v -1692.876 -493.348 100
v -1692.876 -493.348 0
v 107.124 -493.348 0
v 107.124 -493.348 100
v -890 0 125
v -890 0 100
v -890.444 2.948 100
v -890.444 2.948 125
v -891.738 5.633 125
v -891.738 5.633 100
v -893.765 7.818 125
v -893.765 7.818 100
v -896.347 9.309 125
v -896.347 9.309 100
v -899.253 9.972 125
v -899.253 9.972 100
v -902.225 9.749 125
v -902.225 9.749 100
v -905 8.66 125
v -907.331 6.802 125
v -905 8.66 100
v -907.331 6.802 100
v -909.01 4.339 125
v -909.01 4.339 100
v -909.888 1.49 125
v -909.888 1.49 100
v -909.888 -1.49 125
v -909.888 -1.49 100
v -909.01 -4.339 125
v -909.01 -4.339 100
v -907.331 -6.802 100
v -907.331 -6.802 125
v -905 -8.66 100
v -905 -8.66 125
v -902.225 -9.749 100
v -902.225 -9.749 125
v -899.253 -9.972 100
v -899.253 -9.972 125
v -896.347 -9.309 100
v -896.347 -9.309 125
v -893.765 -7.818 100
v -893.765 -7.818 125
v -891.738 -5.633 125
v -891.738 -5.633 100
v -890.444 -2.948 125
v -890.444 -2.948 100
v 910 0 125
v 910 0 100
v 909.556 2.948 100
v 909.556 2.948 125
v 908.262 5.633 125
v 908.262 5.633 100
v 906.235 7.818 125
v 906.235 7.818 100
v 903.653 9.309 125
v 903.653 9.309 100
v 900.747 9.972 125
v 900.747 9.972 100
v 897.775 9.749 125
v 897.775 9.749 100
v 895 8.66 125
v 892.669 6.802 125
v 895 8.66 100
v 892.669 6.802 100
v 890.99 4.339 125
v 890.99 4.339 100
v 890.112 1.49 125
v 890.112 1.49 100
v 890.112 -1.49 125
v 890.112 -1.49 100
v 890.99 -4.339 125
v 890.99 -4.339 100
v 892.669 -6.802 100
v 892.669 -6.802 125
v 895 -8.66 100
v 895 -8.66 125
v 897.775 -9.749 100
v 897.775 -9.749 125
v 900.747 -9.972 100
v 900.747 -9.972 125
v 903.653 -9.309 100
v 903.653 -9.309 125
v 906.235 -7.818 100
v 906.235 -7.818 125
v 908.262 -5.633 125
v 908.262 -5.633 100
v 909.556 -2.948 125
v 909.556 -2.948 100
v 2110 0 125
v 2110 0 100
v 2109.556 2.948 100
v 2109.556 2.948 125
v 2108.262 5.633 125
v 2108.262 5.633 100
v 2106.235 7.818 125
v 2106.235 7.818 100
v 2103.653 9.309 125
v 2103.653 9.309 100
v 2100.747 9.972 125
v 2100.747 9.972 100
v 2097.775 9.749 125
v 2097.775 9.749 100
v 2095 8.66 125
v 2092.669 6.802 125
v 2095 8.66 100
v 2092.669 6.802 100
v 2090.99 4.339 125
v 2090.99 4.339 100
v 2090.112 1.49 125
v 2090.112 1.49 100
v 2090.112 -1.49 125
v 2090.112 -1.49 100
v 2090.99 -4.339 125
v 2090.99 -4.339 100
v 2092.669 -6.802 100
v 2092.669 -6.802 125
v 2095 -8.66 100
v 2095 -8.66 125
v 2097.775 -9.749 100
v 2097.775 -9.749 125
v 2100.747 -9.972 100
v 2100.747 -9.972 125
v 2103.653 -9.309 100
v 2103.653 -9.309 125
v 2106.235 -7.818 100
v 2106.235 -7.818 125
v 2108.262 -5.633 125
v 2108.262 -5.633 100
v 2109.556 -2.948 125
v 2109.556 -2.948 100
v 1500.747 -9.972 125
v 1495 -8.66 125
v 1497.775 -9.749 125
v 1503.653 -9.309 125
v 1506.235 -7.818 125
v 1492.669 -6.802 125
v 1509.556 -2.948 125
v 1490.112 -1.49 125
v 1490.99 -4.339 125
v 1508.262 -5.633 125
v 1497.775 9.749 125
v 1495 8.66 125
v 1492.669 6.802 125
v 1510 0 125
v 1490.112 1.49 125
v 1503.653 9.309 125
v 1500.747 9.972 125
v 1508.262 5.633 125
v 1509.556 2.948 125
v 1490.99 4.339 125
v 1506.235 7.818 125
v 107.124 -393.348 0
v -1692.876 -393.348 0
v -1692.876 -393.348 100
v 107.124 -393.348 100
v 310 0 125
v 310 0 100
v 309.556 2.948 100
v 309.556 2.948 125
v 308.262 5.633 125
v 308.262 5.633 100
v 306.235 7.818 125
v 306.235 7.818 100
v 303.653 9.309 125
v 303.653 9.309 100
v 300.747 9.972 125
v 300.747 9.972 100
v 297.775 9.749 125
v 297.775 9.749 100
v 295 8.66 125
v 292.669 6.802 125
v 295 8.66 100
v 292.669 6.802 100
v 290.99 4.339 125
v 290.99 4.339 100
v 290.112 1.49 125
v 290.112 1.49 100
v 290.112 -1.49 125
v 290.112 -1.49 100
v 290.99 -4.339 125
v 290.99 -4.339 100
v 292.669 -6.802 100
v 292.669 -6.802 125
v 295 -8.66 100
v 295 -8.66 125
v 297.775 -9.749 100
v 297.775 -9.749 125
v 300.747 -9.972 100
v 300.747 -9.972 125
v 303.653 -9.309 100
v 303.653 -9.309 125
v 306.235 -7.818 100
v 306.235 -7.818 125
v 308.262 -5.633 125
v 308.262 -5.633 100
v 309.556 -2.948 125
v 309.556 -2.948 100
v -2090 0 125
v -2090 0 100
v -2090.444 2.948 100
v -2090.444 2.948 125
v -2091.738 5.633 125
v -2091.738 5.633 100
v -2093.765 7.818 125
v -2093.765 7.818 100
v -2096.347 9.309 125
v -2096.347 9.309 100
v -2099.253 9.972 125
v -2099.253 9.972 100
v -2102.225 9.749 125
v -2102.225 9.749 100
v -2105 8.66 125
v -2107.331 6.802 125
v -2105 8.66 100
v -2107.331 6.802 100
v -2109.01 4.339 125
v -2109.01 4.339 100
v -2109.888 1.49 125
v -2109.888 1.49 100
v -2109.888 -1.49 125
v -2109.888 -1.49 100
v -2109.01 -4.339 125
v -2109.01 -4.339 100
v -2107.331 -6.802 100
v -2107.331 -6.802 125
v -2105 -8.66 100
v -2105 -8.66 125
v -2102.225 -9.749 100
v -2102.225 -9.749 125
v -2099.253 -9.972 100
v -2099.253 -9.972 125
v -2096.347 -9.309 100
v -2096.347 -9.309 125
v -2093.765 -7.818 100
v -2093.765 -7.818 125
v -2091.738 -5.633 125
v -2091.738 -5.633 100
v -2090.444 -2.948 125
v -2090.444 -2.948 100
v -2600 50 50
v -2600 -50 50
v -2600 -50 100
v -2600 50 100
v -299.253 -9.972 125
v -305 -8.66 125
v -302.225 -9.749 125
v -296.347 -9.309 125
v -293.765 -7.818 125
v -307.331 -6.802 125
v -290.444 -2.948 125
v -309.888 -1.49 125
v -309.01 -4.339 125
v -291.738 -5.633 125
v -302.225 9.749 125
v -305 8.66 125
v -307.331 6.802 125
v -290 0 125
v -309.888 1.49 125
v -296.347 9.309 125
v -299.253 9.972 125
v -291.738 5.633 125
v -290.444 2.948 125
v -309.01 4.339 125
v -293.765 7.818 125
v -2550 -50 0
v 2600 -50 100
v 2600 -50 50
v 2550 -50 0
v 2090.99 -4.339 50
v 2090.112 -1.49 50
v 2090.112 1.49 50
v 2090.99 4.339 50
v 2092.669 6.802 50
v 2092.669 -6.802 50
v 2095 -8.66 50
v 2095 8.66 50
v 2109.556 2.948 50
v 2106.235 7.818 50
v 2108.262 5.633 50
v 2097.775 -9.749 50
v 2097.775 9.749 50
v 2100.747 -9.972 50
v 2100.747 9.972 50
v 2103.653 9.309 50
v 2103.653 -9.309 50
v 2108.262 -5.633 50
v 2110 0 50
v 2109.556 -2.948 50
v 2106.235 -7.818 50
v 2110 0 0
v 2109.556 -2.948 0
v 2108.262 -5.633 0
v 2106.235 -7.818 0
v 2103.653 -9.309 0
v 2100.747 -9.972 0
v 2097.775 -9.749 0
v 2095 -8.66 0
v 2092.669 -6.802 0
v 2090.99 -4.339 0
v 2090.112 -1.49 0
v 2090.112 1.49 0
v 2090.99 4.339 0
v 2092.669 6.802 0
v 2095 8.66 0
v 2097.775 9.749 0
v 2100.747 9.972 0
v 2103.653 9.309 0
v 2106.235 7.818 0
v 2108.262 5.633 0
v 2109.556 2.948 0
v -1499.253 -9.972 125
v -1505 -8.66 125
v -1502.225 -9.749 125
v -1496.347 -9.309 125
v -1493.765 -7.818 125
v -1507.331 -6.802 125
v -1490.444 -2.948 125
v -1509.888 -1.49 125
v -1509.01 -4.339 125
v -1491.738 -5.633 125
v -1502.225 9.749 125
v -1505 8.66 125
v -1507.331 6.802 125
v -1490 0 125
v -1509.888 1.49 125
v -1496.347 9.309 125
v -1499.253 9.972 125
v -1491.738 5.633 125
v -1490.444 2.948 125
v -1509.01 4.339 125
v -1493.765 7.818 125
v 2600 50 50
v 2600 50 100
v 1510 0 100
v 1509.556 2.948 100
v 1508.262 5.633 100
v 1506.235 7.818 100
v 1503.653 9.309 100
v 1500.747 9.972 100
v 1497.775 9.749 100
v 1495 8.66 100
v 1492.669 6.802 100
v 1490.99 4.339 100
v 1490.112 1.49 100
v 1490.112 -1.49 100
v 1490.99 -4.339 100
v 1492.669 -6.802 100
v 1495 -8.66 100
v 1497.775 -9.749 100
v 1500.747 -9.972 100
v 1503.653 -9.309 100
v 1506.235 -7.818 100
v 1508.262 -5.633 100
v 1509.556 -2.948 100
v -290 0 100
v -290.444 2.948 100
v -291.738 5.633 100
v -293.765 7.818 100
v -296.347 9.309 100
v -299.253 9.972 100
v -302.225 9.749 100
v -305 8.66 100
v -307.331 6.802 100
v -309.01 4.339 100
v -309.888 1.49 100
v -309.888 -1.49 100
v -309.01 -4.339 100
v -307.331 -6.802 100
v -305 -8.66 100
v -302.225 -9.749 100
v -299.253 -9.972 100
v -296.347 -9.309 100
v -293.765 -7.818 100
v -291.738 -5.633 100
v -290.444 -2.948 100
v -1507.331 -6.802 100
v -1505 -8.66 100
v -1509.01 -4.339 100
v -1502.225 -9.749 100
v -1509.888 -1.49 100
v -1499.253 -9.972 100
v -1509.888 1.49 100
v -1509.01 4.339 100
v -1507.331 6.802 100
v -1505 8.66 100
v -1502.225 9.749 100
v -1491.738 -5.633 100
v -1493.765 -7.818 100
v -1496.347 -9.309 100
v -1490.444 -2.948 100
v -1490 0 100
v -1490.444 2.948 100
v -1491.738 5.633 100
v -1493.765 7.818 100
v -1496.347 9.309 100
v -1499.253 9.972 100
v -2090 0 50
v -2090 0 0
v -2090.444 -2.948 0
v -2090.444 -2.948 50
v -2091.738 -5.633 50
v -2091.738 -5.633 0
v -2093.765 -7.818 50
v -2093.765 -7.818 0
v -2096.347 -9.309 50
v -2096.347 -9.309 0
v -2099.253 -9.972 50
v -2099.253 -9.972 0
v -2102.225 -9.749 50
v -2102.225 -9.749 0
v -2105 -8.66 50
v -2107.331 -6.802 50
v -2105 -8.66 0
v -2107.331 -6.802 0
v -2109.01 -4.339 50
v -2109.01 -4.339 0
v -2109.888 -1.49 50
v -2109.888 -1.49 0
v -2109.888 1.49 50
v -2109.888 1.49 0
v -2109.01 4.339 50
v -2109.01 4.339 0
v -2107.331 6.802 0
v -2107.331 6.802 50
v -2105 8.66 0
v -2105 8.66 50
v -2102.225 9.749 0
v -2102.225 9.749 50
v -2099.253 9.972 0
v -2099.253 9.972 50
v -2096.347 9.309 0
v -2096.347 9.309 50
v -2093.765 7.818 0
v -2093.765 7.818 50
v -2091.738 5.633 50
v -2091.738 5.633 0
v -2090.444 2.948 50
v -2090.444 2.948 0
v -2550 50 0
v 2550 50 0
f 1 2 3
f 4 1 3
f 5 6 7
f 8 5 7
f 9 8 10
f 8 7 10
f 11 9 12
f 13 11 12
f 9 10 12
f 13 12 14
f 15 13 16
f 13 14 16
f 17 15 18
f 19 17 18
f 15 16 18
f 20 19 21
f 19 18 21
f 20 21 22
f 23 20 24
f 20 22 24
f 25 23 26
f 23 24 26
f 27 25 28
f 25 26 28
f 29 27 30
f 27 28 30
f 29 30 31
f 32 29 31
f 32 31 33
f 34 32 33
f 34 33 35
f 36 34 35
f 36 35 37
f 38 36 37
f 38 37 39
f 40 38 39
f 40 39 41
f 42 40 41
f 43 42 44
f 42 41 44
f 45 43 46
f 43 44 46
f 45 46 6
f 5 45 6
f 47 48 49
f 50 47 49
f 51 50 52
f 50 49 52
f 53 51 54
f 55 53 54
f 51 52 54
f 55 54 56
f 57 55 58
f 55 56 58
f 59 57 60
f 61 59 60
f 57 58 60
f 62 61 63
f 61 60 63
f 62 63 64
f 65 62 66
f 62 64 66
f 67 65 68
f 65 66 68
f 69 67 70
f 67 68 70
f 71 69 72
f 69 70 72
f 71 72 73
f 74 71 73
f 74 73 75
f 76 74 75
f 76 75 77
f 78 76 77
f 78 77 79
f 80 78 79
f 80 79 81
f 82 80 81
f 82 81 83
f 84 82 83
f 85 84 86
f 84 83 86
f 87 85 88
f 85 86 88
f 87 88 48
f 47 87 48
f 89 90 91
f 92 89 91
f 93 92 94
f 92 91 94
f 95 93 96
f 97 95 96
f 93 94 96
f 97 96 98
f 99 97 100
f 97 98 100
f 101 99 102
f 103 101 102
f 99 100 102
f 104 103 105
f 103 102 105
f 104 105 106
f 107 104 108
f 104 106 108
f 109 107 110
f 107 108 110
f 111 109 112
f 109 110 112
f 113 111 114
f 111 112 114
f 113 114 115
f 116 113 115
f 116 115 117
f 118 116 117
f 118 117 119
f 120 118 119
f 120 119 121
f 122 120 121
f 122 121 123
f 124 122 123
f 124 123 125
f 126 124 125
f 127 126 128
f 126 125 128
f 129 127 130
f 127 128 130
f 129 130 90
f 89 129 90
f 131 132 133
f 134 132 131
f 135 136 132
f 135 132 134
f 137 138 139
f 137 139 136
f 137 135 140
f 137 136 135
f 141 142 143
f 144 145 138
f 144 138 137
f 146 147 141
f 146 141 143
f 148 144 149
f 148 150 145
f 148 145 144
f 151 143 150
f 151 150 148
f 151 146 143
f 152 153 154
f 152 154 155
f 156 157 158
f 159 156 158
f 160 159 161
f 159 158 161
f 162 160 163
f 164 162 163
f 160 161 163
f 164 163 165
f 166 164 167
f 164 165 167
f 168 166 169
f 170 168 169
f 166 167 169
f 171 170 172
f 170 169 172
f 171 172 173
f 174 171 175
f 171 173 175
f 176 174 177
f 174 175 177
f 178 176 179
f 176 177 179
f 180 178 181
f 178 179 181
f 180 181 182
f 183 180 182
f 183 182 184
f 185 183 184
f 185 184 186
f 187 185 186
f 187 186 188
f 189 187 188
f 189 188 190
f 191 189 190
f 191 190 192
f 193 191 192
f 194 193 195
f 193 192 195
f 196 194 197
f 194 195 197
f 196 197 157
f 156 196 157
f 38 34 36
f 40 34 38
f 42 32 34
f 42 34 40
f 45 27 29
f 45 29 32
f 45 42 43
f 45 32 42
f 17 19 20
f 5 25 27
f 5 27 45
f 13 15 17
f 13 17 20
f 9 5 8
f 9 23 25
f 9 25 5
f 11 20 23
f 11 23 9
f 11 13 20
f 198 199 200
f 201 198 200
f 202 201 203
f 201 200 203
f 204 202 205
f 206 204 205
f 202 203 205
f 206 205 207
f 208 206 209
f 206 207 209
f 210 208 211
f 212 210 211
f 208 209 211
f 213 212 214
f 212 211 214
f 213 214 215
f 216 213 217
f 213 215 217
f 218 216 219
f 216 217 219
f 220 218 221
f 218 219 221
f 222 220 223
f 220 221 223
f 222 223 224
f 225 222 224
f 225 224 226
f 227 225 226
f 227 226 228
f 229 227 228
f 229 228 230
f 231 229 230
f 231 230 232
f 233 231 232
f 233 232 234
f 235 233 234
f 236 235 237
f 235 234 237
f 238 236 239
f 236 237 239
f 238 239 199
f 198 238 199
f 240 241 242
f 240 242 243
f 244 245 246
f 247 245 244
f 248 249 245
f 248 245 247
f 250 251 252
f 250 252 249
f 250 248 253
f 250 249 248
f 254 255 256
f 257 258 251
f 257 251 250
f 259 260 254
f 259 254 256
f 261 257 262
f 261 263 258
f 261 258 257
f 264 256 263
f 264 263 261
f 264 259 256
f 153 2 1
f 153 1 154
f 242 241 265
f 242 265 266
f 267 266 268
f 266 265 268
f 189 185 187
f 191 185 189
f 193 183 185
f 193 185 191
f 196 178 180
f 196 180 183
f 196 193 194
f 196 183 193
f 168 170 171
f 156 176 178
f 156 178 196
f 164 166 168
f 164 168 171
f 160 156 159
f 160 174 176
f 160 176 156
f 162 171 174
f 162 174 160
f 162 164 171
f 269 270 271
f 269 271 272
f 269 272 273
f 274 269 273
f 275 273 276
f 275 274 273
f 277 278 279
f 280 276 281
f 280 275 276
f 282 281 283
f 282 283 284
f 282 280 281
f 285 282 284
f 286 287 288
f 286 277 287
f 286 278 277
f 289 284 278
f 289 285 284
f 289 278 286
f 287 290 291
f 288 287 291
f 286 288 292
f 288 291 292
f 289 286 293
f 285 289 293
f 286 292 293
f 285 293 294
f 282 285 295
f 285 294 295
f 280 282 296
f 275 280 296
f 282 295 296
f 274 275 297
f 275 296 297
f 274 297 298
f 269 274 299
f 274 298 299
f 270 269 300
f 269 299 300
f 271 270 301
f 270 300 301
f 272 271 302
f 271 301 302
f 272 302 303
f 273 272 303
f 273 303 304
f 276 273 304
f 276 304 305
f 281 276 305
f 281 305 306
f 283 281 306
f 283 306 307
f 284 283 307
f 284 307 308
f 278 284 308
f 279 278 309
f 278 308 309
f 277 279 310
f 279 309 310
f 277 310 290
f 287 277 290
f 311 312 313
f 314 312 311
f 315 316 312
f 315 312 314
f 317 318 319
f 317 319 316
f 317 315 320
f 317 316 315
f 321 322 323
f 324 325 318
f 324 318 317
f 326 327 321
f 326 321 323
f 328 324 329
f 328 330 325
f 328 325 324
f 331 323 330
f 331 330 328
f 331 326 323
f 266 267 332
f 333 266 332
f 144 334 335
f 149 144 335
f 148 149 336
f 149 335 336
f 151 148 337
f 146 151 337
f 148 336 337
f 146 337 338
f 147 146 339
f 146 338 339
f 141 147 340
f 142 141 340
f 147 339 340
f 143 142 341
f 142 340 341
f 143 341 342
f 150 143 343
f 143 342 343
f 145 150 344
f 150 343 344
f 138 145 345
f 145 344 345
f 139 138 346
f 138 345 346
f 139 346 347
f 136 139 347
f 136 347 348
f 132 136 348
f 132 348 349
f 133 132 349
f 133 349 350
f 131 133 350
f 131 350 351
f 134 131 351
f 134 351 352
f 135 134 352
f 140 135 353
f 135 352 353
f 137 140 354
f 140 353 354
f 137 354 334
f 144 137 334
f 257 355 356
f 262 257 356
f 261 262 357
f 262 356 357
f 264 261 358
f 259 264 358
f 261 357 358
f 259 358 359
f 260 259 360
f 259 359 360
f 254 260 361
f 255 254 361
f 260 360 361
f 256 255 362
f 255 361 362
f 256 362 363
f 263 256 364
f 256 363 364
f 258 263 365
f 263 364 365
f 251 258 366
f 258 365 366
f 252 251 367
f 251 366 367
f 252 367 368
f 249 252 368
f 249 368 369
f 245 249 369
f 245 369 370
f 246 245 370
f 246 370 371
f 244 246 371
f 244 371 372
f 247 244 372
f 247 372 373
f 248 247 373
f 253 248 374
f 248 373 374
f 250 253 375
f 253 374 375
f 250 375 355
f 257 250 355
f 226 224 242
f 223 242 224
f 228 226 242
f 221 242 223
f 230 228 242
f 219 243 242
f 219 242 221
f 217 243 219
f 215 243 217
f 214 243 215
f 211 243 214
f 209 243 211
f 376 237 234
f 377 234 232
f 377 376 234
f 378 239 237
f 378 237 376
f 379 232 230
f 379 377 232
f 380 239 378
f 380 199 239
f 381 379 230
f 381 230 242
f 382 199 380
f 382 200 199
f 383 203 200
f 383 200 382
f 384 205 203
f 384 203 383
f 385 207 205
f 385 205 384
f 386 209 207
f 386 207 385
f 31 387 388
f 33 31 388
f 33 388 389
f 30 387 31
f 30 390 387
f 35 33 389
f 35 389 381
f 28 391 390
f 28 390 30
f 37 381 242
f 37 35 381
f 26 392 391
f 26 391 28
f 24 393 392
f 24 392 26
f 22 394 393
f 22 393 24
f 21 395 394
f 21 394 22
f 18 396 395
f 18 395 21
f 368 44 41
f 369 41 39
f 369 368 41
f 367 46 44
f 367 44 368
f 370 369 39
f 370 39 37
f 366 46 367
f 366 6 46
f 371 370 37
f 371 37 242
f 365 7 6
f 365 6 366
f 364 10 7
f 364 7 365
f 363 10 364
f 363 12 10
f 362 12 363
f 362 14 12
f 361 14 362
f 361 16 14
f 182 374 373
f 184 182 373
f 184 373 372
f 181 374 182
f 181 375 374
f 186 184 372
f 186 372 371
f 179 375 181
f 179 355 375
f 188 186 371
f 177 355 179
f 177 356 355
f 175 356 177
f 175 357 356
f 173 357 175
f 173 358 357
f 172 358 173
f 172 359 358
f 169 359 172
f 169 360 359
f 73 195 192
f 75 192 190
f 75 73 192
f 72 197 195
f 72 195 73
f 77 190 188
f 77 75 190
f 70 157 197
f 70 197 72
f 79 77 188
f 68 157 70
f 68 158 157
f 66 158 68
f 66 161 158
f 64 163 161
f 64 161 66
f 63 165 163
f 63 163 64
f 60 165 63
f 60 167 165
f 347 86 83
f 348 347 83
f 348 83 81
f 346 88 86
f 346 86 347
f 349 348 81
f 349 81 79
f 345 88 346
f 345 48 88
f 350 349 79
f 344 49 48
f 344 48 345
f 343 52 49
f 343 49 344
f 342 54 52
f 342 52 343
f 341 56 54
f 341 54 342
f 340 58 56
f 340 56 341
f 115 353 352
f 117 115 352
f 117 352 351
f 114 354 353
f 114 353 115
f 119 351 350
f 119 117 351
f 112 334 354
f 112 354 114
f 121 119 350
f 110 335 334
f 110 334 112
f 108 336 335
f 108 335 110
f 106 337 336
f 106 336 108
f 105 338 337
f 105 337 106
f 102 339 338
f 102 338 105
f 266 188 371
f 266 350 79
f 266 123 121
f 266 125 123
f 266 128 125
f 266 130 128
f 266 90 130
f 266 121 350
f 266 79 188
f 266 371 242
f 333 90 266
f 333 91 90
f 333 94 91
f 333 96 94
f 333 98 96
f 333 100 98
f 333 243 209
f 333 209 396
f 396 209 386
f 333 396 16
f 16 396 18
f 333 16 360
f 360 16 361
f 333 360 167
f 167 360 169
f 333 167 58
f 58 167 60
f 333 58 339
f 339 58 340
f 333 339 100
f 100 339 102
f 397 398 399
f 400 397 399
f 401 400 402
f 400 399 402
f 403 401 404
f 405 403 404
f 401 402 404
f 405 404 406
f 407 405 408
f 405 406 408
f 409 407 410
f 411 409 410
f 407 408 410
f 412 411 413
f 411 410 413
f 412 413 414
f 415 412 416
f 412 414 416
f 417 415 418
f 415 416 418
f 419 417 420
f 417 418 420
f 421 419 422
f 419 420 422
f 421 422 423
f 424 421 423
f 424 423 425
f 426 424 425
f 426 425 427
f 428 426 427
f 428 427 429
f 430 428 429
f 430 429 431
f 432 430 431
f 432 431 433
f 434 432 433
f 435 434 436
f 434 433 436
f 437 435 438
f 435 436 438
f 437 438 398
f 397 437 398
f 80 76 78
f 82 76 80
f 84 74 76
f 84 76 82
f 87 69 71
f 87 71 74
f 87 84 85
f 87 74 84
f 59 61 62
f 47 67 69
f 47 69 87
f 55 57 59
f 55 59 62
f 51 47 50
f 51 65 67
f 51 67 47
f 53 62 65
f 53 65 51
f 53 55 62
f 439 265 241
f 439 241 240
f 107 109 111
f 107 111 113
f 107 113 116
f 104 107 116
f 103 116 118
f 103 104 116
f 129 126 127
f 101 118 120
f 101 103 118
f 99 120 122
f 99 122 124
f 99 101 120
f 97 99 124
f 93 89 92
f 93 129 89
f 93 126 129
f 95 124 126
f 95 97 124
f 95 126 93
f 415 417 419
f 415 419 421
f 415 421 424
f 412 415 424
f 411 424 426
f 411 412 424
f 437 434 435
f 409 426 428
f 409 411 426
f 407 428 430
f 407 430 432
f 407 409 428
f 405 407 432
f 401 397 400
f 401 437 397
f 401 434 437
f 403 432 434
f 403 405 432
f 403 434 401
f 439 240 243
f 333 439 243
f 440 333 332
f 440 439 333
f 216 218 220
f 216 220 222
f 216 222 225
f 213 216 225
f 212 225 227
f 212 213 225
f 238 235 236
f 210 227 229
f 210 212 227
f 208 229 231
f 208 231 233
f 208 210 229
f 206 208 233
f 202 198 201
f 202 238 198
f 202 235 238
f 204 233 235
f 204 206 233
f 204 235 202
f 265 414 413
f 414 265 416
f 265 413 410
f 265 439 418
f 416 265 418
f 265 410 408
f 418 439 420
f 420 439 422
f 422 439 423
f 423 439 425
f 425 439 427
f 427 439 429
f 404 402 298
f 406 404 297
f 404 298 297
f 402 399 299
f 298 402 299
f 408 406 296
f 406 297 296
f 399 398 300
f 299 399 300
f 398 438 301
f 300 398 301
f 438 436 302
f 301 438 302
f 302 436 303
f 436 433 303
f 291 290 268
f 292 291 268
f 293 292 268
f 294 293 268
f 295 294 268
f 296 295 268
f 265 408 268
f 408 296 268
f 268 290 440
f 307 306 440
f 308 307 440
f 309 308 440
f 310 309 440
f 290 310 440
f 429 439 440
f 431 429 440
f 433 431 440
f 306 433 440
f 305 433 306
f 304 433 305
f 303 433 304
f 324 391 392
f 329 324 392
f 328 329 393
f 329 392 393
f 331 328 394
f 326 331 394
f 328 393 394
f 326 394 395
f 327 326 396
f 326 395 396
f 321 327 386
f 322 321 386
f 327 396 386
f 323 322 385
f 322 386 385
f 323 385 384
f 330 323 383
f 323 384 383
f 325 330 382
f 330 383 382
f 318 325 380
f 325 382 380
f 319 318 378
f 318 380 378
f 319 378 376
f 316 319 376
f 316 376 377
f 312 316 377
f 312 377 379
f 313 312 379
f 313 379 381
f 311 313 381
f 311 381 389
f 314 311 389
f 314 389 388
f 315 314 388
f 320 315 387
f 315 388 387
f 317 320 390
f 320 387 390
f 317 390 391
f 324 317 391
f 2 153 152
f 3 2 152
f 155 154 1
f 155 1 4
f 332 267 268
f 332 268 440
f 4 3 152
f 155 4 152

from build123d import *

# Parameters (mm, degrees)
F0_W     = 5200
F0_H     = 100
F0_W_2   = 1800
F1_DEPTH = 100
F2_R     = 10
F3_DEPTH = 50
F4_R     = 10
F5_DEPTH = 25
F6_SIZE  = 50


with BuildPart() as f1:
    # F0 (on Top) → F1 (new body)
    with BuildSketch(Plane.XY):
        Rectangle(F0_W, F0_H)
        with Locations((-792.875862, -443.347555)):
            Rectangle(F0_W_2, F0_H)
    extrude(amount=F1_DEPTH)

    # F2 (on face) → F3 (cut)
    with BuildSketch(Plane(origin=(0, 0, 0), x_dir=(1, 0, 0), z_dir=(0, 0, -1))):
        with Locations((-2100, 0)):
            Circle(F2_R)
        with Locations((2100, 0)):
            Circle(F2_R)
    extrude(amount=-F3_DEPTH, mode=Mode.SUBTRACT)

    # F4 (on face) → F5 (join)
    with BuildSketch(Plane.XY.offset(100)):
        with Locations((-2100, 0)):
            Circle(F4_R)
        with Locations((-1500, 0)):
            Circle(F4_R)
        with Locations((-900, 0)):
            Circle(F4_R)
        with Locations((-300, 0)):
            Circle(F4_R)
        with Locations((300, 0)):
            Circle(F4_R)
        with Locations((900, 0)):
            Circle(F4_R)
        with Locations((1500, 0)):
            Circle(F4_R)
        with Locations((2100, 0)):
            Circle(F4_R)
    extrude(amount=F5_DEPTH)

    # F6
    f6_edges = [f1.edges().sort_by_distance(p)[0] for p in [
        (-2600, 0, 0),
        (2600, 0, 0),
    ]]
    chamfer(f6_edges, length=F6_SIZE)


solid = f1.part
